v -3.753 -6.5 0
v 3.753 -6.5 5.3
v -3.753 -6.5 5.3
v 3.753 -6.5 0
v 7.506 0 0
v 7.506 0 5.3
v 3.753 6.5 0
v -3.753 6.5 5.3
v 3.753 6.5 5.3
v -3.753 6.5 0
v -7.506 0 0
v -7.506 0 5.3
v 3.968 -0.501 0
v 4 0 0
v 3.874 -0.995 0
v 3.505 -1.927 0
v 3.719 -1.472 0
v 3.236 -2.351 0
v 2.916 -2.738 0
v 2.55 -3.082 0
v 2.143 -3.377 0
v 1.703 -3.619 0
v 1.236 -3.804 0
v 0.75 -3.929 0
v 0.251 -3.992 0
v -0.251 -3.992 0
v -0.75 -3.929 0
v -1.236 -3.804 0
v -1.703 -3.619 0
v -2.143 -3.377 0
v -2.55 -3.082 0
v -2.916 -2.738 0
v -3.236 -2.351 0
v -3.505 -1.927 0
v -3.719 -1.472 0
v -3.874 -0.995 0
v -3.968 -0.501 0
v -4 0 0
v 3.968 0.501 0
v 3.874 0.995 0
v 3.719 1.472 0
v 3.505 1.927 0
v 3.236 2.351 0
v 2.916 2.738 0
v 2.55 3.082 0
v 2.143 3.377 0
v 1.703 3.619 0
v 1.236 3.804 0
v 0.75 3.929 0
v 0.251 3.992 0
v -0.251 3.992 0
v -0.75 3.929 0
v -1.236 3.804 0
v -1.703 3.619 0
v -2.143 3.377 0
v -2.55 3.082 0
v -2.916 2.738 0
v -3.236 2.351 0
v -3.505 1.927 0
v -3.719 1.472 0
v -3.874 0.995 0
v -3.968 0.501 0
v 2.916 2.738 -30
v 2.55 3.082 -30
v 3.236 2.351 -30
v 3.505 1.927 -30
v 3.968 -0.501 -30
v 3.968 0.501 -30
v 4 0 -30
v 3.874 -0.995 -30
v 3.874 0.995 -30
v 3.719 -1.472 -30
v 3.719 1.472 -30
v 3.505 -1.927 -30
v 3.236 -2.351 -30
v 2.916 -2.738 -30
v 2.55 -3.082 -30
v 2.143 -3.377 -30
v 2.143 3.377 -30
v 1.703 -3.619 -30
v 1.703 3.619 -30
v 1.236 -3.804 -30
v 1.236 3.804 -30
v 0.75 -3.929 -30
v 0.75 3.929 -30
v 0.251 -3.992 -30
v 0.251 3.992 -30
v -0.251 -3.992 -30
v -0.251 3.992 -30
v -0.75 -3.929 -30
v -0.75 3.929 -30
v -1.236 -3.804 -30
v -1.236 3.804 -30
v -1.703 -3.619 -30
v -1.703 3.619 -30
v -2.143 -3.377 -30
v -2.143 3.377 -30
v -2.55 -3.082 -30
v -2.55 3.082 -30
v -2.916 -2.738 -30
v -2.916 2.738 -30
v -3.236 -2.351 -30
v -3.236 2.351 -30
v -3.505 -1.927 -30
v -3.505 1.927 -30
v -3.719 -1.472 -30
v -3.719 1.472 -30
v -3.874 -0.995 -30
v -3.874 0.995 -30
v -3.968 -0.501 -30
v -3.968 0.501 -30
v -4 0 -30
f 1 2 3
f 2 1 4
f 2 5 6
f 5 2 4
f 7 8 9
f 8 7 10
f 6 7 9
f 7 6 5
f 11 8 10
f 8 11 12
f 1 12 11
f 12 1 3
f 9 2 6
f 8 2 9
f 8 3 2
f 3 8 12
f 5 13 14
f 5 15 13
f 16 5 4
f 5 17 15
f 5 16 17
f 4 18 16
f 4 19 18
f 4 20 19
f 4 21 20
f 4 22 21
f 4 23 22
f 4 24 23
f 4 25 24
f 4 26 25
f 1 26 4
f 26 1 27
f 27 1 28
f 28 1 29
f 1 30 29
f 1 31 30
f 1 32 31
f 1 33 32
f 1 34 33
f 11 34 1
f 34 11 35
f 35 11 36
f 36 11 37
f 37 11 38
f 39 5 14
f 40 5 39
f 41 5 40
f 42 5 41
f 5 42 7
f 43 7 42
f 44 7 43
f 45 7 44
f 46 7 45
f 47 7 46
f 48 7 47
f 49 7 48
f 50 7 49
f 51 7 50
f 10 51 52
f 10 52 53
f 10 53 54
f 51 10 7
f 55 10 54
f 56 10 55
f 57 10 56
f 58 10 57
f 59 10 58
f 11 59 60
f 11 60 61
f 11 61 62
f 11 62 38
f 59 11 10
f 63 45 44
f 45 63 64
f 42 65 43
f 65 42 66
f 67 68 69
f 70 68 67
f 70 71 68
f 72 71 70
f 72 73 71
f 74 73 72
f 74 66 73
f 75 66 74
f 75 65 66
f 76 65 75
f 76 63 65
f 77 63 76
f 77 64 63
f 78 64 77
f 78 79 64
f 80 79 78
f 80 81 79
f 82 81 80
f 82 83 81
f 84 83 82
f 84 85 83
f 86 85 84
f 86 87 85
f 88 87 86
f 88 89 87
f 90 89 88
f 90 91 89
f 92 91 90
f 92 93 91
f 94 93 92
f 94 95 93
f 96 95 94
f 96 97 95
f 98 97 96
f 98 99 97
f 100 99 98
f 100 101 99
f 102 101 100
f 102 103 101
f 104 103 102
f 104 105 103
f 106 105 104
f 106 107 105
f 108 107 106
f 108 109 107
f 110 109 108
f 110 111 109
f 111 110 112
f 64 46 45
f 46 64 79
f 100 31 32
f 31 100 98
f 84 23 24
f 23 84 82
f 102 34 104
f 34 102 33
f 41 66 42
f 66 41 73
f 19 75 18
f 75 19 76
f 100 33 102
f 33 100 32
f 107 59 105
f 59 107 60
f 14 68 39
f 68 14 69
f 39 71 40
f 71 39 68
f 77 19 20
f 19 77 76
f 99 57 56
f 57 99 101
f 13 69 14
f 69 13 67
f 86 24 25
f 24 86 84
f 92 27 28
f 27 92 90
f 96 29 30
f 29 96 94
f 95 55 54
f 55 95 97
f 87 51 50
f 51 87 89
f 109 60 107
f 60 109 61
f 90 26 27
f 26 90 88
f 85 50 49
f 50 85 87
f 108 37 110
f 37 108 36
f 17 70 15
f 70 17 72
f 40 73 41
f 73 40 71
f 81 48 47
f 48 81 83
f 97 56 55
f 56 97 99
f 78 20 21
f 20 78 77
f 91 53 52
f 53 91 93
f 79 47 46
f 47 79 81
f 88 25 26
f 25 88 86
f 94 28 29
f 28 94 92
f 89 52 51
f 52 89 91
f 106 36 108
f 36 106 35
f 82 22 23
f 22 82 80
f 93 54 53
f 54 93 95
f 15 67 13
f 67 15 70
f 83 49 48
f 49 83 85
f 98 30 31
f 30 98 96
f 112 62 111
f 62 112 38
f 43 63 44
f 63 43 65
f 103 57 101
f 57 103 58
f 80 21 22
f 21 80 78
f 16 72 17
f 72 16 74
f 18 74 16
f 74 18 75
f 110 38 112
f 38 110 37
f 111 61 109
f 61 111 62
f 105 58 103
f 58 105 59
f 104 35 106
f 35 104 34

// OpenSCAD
$fn = 50;

// M8 Hex Bolt
union() {
    // Hex head
    cylinder(h = 5.3, d = 13 / cos(30), $fn = 6);
    
    // Shank
    translate([0, 0, -30])
        cylinder(h = 30, d = 8);
}
